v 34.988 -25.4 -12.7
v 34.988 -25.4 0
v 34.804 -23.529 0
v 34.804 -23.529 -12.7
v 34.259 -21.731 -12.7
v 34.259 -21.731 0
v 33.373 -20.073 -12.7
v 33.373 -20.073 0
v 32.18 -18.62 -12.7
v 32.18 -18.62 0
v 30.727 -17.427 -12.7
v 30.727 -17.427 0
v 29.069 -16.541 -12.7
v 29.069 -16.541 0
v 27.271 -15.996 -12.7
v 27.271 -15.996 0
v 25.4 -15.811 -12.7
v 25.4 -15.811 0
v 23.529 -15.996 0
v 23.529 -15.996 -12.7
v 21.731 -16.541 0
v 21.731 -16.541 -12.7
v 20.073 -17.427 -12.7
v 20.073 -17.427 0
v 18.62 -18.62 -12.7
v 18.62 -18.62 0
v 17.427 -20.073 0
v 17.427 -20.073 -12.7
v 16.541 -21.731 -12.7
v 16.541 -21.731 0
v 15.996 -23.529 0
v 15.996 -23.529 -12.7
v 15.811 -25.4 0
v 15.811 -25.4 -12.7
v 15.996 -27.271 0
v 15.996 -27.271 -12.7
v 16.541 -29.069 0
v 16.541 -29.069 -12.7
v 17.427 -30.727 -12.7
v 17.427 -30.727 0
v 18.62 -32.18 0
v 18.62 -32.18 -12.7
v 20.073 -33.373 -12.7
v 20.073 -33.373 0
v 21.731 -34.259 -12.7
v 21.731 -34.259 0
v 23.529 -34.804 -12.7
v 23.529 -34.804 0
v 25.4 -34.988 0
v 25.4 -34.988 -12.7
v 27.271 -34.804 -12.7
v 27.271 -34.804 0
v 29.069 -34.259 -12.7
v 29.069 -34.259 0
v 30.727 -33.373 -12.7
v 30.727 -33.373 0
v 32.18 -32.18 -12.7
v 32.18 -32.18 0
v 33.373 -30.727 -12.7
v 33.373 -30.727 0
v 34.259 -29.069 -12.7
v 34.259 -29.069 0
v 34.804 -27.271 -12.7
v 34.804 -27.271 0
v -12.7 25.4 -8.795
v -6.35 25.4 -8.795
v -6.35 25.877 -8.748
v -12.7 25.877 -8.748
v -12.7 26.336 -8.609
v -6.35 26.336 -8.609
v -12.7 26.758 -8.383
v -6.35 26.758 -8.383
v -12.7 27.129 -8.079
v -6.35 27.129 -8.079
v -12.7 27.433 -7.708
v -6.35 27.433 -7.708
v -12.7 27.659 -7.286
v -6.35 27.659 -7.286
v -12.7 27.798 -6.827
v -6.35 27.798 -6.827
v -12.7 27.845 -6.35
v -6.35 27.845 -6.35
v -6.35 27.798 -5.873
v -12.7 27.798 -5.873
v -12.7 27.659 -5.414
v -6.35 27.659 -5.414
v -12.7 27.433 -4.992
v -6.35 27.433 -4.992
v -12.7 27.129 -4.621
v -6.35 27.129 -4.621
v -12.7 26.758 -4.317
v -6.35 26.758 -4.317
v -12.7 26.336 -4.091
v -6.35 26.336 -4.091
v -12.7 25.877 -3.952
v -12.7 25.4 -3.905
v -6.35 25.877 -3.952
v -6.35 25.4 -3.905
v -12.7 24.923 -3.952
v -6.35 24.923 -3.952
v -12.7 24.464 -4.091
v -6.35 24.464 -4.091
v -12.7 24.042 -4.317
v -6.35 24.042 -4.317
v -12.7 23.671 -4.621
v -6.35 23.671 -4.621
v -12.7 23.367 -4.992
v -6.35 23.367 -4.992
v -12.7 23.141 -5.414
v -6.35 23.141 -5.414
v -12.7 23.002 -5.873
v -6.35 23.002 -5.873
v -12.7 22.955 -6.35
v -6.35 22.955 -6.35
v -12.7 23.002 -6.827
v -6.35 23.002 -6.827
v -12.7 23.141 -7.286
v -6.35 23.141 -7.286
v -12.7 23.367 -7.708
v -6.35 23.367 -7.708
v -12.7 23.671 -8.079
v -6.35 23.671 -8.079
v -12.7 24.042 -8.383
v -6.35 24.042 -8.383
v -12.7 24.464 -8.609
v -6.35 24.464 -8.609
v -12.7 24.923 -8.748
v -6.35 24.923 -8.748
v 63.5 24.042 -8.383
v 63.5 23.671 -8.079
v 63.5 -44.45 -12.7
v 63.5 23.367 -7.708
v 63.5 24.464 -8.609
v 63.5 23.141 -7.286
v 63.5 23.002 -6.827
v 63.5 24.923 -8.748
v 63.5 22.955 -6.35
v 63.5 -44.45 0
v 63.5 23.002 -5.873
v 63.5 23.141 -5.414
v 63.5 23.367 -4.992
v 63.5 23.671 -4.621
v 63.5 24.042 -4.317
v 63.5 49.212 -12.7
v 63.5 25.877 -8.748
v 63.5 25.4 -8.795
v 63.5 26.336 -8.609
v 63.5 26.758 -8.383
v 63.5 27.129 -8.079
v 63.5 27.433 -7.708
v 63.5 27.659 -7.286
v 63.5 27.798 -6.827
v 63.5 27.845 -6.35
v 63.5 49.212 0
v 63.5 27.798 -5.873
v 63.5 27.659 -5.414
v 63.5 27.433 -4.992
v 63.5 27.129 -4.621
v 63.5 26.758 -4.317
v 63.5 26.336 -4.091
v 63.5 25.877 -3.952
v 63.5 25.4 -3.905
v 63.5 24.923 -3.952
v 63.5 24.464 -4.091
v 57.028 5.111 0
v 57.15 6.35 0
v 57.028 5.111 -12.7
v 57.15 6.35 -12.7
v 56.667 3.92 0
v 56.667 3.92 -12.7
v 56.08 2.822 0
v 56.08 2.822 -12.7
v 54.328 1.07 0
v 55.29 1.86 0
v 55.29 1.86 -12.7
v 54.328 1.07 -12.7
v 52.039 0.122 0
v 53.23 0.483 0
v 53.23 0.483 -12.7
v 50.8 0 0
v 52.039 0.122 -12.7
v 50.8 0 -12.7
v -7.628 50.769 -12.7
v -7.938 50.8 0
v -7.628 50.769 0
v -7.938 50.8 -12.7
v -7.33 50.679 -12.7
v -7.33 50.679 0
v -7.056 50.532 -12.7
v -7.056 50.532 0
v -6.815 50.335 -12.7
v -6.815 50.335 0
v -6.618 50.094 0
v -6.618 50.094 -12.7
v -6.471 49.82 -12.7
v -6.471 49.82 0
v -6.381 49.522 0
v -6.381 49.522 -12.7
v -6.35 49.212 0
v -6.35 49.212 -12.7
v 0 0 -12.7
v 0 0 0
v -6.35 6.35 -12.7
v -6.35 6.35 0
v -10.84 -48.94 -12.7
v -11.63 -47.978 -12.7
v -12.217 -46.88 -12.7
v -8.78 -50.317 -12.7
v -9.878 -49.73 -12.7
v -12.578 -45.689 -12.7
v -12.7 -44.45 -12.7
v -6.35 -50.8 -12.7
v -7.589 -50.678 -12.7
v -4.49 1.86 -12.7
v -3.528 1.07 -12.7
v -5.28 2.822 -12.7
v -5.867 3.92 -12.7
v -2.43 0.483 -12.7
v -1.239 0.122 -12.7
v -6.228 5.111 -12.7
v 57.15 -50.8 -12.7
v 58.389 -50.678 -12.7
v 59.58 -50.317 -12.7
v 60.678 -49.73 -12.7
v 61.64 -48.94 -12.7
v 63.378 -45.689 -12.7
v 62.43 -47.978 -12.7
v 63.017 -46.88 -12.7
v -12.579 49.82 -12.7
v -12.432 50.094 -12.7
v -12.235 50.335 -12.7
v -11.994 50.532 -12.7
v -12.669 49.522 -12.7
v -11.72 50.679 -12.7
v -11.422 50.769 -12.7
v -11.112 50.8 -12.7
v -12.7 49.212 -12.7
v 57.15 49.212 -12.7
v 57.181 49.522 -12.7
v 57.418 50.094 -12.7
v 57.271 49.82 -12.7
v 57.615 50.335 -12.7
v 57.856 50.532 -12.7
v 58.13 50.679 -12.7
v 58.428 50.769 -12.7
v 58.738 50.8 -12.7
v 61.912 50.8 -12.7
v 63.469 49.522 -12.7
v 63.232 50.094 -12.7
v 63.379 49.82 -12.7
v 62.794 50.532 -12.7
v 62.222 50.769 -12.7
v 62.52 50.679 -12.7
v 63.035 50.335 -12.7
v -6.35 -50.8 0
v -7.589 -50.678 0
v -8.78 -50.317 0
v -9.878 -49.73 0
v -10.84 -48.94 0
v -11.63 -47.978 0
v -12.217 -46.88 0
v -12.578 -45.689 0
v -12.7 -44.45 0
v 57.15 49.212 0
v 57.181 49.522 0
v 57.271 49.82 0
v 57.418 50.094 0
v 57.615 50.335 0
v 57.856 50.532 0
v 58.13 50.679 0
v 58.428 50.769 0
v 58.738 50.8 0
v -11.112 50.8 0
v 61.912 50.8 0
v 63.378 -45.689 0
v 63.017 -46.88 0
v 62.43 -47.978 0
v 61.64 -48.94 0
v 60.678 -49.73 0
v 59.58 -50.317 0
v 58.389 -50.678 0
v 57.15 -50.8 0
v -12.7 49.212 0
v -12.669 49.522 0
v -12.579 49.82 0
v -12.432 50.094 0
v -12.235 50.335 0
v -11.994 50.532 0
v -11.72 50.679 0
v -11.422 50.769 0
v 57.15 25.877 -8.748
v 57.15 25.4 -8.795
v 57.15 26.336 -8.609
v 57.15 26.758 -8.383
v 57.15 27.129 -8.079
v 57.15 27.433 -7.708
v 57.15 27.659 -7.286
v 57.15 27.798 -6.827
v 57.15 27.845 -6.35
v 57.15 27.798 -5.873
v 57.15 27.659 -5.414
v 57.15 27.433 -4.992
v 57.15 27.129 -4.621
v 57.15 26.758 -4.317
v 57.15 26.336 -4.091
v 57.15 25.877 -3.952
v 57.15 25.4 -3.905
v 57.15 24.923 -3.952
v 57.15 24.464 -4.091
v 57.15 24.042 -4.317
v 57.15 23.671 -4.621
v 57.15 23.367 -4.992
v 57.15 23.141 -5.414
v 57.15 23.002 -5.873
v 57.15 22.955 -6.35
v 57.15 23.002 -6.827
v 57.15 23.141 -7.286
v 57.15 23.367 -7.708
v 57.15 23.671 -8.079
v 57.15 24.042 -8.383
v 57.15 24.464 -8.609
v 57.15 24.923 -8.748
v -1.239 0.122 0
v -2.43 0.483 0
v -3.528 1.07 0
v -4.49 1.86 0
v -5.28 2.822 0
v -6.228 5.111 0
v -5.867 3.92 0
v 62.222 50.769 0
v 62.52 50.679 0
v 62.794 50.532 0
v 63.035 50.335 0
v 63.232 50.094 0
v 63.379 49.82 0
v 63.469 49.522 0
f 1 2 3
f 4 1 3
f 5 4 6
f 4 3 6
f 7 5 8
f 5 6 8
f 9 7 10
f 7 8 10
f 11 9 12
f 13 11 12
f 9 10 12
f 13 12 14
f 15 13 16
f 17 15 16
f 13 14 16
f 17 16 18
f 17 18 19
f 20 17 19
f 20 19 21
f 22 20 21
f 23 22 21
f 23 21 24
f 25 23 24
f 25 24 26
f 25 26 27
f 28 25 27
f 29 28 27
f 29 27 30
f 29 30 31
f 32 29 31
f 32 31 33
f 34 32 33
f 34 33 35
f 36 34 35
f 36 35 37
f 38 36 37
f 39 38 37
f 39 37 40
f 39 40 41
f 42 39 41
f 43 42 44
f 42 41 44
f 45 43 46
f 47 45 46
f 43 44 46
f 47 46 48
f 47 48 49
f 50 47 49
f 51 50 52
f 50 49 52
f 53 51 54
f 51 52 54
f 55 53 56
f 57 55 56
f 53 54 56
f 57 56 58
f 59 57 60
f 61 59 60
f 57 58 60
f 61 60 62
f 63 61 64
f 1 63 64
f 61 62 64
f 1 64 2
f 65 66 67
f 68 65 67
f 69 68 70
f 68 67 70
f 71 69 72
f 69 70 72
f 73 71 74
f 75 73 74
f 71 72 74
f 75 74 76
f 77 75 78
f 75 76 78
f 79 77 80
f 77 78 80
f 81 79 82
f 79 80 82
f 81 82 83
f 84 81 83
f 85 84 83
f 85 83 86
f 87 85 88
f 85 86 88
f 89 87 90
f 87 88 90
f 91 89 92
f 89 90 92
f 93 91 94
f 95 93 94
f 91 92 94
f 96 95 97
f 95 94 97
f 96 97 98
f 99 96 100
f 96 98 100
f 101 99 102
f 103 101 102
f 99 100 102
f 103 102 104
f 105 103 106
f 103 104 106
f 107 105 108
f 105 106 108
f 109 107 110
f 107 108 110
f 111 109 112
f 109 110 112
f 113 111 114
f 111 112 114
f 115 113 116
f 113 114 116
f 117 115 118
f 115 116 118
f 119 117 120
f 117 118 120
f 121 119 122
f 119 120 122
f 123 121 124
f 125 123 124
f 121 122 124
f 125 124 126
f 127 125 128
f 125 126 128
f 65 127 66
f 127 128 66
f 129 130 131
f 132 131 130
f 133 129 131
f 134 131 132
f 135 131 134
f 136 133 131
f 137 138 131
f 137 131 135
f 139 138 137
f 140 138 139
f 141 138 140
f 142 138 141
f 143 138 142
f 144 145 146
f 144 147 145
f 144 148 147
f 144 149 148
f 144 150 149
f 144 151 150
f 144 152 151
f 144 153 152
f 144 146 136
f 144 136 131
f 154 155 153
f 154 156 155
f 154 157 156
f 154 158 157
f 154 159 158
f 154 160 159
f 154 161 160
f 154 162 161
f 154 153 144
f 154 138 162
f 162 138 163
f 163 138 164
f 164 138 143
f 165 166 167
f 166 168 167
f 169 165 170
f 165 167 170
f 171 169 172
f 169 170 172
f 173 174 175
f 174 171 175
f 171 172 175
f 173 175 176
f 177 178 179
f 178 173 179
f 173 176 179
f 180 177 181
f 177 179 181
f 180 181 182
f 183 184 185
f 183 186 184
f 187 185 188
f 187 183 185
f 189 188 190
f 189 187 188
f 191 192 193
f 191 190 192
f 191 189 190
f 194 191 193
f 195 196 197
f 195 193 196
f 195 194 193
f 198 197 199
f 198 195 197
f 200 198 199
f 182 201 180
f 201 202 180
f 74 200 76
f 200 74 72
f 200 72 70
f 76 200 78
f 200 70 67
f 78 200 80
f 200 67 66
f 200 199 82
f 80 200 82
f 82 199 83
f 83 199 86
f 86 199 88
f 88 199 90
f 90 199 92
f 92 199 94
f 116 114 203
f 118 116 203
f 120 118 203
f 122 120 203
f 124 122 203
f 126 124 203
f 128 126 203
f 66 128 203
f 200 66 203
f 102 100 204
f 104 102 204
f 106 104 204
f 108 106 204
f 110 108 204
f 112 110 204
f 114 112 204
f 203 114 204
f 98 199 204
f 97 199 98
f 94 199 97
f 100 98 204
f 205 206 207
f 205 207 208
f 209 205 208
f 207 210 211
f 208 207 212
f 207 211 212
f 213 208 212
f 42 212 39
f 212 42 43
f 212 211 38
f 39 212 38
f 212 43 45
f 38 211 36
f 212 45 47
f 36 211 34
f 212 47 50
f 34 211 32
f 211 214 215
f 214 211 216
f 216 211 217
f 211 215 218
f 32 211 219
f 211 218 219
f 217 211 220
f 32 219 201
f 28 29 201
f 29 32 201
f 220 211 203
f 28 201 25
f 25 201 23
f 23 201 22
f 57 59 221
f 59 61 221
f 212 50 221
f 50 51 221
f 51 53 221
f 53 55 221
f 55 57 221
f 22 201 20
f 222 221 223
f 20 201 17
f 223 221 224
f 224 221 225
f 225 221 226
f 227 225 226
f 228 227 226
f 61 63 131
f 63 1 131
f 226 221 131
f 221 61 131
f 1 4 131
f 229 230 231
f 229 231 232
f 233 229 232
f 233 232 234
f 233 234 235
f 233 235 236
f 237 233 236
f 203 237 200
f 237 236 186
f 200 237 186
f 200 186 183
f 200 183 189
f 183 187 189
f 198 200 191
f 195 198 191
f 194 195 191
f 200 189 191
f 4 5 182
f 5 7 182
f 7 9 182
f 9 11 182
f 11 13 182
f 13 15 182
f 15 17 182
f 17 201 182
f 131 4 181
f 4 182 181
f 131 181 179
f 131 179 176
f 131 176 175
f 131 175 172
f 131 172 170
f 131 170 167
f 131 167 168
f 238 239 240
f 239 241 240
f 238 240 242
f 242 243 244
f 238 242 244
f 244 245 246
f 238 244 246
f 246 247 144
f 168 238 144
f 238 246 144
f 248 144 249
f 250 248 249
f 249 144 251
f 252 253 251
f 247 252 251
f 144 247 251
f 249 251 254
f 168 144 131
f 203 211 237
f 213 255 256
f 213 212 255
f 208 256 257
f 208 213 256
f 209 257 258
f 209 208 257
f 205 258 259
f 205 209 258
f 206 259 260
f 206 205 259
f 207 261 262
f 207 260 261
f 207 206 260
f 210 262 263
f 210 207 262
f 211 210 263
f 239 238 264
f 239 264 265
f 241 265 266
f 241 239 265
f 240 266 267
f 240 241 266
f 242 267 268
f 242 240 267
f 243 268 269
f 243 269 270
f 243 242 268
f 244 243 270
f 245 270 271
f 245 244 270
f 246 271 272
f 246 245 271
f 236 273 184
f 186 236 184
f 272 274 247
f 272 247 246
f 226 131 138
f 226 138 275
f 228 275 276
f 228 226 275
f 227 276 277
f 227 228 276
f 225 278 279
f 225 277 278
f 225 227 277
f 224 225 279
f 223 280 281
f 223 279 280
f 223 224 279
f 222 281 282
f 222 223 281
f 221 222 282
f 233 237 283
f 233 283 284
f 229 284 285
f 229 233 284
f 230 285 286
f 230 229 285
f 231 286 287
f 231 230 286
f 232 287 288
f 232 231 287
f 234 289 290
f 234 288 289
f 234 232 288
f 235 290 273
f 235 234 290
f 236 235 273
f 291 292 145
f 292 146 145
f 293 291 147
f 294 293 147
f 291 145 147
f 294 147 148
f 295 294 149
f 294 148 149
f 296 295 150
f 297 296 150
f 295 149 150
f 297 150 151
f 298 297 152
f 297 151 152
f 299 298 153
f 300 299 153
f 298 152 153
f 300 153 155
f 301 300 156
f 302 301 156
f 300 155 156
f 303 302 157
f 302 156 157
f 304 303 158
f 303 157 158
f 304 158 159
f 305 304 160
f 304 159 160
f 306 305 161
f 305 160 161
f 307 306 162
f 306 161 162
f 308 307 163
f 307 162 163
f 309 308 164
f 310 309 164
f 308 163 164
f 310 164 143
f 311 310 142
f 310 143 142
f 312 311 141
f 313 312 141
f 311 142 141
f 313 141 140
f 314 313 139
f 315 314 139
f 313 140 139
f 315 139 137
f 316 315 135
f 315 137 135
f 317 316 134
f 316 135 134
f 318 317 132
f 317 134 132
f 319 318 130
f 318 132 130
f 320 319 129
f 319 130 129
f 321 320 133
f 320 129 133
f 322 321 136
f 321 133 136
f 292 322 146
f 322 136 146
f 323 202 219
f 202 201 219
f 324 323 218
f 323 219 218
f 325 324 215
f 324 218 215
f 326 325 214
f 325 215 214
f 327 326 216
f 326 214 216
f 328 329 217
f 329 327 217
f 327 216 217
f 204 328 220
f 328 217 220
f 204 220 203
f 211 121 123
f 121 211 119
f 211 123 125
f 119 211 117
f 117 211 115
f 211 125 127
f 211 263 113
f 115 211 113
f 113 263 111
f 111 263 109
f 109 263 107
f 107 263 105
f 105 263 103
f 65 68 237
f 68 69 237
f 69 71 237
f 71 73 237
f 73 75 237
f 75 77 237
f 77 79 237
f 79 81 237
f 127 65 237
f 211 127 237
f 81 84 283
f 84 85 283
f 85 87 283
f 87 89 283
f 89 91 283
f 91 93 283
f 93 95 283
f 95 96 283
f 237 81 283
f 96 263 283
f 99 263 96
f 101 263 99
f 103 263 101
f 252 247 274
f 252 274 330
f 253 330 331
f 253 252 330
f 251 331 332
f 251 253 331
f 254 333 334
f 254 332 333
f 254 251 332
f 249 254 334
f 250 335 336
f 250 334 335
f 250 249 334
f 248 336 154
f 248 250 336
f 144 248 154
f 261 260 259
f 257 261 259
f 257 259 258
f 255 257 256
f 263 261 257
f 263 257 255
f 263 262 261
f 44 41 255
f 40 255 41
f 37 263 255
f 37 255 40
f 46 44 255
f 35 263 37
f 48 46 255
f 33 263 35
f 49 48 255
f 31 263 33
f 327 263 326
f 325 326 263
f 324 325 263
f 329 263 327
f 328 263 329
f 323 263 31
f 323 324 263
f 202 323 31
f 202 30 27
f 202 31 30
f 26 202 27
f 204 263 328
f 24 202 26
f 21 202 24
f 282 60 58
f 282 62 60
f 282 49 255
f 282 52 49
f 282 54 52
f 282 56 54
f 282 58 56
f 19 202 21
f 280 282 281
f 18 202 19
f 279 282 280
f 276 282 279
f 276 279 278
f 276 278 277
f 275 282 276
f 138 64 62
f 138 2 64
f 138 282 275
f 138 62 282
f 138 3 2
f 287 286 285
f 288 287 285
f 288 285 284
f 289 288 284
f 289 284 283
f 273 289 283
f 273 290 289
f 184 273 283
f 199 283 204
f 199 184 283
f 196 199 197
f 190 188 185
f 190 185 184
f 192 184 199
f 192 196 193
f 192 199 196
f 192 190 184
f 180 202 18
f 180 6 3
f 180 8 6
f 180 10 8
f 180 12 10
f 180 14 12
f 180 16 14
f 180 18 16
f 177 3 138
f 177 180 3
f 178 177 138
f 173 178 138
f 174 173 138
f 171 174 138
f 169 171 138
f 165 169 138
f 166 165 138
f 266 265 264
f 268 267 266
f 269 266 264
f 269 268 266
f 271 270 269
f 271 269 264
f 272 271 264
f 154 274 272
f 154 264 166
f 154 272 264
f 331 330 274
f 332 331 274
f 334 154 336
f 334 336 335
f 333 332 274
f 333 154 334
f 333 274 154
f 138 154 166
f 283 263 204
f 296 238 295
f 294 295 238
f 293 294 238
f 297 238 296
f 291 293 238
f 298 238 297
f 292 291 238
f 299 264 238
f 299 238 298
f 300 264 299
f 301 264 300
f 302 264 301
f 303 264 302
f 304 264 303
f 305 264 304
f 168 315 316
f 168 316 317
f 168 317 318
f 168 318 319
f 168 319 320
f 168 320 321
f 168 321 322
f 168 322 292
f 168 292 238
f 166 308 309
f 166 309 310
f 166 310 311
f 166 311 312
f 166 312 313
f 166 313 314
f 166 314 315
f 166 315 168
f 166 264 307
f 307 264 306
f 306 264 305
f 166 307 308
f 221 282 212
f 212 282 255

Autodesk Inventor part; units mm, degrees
ref_plane "YZ Plane" through (0, 0, 0) normal (1, 0, 0) x (0, 1, 0)
ref_plane "XZ Plane" through (0, 0, 0) normal (0, 1, 0) x (-1, 0, 0)
ref_plane "XY Plane" through (0, 0, 0) normal (0, 0, 1) x (1, 0, 0)
sketch "Sketch1" plane through (0, 0, 0) normal (0, 0, 1) x (1, 0, 0)
  line L0 (0, 0) -> (50.8, 0)
  line L1 (50.8, 0) -> (50.8, -50.8)
  line L2 (50.8, -50.8) -> (0, -50.8)
  line L3 (0, -50.8) -> (0, 0)
  circle A0 centre (25.4, -25.4) radius 9.5885
  line L4 (0, -50.8) -> (-12.7, -50.8)
  line L5 (-12.7, -50.8) -> (-12.7, 50.8)
  line L6 (-12.7, 50.8) -> (-6.35, 50.8)
  line L7 (0, 0) -> (0, -50.8)
  line L8 (50.8, -50.8) -> (63.5, -50.8)
  line L9 (63.5, -50.8) -> (63.5, 50.8)
  line L10 (63.5, 50.8) -> (57.15, 50.8)
  line L11 (50.8, 0) -> (50.8, -50.8)
  line L12 (-6.35, 50.8) -> (-6.35, 0)
  line L13 (-6.35, 0) -> (0, 0)
  line L14 (57.15, 50.8) -> (57.15, 0)
  line L15 (57.15, 0) -> (50.8, 0)
  dimension "d0" = 19.177
  dimension "d1" = 50.8
  dimension "d2" = 50.8
  dimension "d37" = 25.4
  dimension "d44" = 101.6
  dimension "d45" = 101.6
extrude "Extrusion1" add sketch "Sketch1" against normal blind 12.7
sketch "Sketch9" plane through (63.5, -50.8, 0) normal (1, 0, 0) x (0, 0, -1)
  line L0 (0, 101.6) -> (0, 0) projected
  line L1 (0, 101.6) -> (12.7, 101.6) projected
  circle A0 centre (6.35, 76.2) radius 2.4447
  point P0 (0, 50.8)
  dimension "d48" = 4.8895
  dimension "d49" = 6.35
  dimension "d50" = 25.4
extrude "Extrusion9" cut sketch "Sketch9" against normal through all
fillet "Fillet13" radius 1.5875 4 edges at (-12.7, 50.8, -6.35) (-6.35, 50.8, -6.35) (57.15, 50.8, -6.35) (63.5, 50.8, -6.35)
fillet "Fillet14" radius 6.35 4 edges at (63.5, -50.8, -6.35) (-12.7, -50.8, -6.35) (-6.35, 0, -6.35) (57.15, 0, -6.35)
properties part number "Needle Bearing Mount" material "ABS Plastic"
